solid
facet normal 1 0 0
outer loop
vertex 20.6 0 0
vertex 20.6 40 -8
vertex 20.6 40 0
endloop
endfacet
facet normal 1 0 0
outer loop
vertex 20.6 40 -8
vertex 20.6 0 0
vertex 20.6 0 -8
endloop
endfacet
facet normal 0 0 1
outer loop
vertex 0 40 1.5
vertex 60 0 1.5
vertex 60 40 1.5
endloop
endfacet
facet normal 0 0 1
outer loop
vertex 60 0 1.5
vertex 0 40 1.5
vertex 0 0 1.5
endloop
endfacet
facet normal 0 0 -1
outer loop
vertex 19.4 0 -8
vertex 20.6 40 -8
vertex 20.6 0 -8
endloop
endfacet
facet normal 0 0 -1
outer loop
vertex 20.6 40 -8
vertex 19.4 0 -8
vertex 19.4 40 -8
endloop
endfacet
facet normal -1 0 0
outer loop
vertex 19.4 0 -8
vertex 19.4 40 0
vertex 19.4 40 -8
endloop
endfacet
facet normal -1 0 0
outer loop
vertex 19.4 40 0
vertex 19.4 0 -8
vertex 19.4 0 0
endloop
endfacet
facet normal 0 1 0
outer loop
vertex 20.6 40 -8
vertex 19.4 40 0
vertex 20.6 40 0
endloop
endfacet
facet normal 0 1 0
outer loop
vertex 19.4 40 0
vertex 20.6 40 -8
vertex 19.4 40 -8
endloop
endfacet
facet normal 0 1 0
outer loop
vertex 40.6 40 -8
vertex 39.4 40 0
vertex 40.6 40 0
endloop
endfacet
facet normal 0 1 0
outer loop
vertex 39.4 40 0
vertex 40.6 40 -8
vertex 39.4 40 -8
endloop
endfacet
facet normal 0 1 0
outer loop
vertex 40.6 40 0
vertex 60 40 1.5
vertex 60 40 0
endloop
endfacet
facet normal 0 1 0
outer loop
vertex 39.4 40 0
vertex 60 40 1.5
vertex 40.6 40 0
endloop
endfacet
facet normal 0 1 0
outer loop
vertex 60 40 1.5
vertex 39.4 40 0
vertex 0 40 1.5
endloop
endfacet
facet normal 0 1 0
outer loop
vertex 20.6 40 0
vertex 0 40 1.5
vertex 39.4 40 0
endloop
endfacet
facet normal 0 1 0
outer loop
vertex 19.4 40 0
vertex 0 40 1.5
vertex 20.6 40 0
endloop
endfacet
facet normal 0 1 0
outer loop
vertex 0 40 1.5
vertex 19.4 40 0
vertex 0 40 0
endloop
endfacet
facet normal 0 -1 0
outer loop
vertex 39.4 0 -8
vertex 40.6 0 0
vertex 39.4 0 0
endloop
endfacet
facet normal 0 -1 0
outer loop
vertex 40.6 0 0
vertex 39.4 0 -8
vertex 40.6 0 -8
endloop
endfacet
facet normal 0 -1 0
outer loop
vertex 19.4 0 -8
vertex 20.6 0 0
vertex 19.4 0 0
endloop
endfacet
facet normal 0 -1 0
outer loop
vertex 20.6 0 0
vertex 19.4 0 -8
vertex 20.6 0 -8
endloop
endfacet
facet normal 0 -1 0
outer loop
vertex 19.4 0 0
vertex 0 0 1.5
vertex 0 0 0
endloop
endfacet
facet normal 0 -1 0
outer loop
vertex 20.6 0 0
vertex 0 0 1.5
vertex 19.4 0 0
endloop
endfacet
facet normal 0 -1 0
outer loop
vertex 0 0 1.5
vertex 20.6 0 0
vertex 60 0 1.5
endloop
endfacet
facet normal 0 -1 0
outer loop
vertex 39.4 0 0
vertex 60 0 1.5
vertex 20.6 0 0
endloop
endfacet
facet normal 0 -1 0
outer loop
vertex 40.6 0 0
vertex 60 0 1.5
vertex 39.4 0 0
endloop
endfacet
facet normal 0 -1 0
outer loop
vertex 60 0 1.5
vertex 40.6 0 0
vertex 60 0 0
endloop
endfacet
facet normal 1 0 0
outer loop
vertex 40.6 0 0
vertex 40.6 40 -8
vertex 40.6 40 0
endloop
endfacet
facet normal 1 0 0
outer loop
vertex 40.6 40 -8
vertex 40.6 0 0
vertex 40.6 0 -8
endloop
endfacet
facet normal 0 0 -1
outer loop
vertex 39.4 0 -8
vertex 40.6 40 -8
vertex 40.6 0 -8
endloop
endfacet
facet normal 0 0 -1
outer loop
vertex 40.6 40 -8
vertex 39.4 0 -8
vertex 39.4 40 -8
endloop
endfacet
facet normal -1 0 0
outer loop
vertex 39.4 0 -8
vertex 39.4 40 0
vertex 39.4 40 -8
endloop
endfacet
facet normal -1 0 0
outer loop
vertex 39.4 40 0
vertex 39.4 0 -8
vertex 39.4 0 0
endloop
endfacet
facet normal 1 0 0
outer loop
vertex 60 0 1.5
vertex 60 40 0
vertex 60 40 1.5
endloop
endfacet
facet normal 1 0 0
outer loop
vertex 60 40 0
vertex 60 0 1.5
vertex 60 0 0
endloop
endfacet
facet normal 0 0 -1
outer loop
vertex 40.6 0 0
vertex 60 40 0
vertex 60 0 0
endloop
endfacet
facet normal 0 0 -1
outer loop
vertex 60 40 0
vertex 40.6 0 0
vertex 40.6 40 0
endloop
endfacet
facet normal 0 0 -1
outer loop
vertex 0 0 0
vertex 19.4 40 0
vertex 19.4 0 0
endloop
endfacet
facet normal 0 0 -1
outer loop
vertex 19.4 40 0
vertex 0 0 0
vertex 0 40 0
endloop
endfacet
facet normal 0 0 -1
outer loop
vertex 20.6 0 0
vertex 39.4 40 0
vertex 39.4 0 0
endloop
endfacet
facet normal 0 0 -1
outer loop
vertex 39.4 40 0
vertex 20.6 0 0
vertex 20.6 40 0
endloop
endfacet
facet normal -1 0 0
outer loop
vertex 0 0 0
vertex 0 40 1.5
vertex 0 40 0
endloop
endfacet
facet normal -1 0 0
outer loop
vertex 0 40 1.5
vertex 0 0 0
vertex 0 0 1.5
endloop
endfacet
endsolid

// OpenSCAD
$fn = 32;

// ----------------------------------------------------------------------
// Ribbed panel: 1.5 mm panel
// ----------------------------------------------------------------------

// --- parameters (mm) ---
panel_l = 60;             // panel length, X
panel_w = 40;             // panel width, Y
panel_t = 1.5;            // panel thickness, Z
rib_t = 1.2;              // rib thickness
rib_h = 8;                // rib height below the panel
ribs = 2;                 // number of ribs

total_h = panel_t + rib_h;  // overall height

union() {
  cube([panel_l, panel_w, panel_t]);
  for (i = [1 : ribs])
    translate([i * panel_l / (ribs + 1) - rib_t / 2, 0, -rib_h])
      cube([rib_t, panel_w, rib_h + panel_t]);
}
